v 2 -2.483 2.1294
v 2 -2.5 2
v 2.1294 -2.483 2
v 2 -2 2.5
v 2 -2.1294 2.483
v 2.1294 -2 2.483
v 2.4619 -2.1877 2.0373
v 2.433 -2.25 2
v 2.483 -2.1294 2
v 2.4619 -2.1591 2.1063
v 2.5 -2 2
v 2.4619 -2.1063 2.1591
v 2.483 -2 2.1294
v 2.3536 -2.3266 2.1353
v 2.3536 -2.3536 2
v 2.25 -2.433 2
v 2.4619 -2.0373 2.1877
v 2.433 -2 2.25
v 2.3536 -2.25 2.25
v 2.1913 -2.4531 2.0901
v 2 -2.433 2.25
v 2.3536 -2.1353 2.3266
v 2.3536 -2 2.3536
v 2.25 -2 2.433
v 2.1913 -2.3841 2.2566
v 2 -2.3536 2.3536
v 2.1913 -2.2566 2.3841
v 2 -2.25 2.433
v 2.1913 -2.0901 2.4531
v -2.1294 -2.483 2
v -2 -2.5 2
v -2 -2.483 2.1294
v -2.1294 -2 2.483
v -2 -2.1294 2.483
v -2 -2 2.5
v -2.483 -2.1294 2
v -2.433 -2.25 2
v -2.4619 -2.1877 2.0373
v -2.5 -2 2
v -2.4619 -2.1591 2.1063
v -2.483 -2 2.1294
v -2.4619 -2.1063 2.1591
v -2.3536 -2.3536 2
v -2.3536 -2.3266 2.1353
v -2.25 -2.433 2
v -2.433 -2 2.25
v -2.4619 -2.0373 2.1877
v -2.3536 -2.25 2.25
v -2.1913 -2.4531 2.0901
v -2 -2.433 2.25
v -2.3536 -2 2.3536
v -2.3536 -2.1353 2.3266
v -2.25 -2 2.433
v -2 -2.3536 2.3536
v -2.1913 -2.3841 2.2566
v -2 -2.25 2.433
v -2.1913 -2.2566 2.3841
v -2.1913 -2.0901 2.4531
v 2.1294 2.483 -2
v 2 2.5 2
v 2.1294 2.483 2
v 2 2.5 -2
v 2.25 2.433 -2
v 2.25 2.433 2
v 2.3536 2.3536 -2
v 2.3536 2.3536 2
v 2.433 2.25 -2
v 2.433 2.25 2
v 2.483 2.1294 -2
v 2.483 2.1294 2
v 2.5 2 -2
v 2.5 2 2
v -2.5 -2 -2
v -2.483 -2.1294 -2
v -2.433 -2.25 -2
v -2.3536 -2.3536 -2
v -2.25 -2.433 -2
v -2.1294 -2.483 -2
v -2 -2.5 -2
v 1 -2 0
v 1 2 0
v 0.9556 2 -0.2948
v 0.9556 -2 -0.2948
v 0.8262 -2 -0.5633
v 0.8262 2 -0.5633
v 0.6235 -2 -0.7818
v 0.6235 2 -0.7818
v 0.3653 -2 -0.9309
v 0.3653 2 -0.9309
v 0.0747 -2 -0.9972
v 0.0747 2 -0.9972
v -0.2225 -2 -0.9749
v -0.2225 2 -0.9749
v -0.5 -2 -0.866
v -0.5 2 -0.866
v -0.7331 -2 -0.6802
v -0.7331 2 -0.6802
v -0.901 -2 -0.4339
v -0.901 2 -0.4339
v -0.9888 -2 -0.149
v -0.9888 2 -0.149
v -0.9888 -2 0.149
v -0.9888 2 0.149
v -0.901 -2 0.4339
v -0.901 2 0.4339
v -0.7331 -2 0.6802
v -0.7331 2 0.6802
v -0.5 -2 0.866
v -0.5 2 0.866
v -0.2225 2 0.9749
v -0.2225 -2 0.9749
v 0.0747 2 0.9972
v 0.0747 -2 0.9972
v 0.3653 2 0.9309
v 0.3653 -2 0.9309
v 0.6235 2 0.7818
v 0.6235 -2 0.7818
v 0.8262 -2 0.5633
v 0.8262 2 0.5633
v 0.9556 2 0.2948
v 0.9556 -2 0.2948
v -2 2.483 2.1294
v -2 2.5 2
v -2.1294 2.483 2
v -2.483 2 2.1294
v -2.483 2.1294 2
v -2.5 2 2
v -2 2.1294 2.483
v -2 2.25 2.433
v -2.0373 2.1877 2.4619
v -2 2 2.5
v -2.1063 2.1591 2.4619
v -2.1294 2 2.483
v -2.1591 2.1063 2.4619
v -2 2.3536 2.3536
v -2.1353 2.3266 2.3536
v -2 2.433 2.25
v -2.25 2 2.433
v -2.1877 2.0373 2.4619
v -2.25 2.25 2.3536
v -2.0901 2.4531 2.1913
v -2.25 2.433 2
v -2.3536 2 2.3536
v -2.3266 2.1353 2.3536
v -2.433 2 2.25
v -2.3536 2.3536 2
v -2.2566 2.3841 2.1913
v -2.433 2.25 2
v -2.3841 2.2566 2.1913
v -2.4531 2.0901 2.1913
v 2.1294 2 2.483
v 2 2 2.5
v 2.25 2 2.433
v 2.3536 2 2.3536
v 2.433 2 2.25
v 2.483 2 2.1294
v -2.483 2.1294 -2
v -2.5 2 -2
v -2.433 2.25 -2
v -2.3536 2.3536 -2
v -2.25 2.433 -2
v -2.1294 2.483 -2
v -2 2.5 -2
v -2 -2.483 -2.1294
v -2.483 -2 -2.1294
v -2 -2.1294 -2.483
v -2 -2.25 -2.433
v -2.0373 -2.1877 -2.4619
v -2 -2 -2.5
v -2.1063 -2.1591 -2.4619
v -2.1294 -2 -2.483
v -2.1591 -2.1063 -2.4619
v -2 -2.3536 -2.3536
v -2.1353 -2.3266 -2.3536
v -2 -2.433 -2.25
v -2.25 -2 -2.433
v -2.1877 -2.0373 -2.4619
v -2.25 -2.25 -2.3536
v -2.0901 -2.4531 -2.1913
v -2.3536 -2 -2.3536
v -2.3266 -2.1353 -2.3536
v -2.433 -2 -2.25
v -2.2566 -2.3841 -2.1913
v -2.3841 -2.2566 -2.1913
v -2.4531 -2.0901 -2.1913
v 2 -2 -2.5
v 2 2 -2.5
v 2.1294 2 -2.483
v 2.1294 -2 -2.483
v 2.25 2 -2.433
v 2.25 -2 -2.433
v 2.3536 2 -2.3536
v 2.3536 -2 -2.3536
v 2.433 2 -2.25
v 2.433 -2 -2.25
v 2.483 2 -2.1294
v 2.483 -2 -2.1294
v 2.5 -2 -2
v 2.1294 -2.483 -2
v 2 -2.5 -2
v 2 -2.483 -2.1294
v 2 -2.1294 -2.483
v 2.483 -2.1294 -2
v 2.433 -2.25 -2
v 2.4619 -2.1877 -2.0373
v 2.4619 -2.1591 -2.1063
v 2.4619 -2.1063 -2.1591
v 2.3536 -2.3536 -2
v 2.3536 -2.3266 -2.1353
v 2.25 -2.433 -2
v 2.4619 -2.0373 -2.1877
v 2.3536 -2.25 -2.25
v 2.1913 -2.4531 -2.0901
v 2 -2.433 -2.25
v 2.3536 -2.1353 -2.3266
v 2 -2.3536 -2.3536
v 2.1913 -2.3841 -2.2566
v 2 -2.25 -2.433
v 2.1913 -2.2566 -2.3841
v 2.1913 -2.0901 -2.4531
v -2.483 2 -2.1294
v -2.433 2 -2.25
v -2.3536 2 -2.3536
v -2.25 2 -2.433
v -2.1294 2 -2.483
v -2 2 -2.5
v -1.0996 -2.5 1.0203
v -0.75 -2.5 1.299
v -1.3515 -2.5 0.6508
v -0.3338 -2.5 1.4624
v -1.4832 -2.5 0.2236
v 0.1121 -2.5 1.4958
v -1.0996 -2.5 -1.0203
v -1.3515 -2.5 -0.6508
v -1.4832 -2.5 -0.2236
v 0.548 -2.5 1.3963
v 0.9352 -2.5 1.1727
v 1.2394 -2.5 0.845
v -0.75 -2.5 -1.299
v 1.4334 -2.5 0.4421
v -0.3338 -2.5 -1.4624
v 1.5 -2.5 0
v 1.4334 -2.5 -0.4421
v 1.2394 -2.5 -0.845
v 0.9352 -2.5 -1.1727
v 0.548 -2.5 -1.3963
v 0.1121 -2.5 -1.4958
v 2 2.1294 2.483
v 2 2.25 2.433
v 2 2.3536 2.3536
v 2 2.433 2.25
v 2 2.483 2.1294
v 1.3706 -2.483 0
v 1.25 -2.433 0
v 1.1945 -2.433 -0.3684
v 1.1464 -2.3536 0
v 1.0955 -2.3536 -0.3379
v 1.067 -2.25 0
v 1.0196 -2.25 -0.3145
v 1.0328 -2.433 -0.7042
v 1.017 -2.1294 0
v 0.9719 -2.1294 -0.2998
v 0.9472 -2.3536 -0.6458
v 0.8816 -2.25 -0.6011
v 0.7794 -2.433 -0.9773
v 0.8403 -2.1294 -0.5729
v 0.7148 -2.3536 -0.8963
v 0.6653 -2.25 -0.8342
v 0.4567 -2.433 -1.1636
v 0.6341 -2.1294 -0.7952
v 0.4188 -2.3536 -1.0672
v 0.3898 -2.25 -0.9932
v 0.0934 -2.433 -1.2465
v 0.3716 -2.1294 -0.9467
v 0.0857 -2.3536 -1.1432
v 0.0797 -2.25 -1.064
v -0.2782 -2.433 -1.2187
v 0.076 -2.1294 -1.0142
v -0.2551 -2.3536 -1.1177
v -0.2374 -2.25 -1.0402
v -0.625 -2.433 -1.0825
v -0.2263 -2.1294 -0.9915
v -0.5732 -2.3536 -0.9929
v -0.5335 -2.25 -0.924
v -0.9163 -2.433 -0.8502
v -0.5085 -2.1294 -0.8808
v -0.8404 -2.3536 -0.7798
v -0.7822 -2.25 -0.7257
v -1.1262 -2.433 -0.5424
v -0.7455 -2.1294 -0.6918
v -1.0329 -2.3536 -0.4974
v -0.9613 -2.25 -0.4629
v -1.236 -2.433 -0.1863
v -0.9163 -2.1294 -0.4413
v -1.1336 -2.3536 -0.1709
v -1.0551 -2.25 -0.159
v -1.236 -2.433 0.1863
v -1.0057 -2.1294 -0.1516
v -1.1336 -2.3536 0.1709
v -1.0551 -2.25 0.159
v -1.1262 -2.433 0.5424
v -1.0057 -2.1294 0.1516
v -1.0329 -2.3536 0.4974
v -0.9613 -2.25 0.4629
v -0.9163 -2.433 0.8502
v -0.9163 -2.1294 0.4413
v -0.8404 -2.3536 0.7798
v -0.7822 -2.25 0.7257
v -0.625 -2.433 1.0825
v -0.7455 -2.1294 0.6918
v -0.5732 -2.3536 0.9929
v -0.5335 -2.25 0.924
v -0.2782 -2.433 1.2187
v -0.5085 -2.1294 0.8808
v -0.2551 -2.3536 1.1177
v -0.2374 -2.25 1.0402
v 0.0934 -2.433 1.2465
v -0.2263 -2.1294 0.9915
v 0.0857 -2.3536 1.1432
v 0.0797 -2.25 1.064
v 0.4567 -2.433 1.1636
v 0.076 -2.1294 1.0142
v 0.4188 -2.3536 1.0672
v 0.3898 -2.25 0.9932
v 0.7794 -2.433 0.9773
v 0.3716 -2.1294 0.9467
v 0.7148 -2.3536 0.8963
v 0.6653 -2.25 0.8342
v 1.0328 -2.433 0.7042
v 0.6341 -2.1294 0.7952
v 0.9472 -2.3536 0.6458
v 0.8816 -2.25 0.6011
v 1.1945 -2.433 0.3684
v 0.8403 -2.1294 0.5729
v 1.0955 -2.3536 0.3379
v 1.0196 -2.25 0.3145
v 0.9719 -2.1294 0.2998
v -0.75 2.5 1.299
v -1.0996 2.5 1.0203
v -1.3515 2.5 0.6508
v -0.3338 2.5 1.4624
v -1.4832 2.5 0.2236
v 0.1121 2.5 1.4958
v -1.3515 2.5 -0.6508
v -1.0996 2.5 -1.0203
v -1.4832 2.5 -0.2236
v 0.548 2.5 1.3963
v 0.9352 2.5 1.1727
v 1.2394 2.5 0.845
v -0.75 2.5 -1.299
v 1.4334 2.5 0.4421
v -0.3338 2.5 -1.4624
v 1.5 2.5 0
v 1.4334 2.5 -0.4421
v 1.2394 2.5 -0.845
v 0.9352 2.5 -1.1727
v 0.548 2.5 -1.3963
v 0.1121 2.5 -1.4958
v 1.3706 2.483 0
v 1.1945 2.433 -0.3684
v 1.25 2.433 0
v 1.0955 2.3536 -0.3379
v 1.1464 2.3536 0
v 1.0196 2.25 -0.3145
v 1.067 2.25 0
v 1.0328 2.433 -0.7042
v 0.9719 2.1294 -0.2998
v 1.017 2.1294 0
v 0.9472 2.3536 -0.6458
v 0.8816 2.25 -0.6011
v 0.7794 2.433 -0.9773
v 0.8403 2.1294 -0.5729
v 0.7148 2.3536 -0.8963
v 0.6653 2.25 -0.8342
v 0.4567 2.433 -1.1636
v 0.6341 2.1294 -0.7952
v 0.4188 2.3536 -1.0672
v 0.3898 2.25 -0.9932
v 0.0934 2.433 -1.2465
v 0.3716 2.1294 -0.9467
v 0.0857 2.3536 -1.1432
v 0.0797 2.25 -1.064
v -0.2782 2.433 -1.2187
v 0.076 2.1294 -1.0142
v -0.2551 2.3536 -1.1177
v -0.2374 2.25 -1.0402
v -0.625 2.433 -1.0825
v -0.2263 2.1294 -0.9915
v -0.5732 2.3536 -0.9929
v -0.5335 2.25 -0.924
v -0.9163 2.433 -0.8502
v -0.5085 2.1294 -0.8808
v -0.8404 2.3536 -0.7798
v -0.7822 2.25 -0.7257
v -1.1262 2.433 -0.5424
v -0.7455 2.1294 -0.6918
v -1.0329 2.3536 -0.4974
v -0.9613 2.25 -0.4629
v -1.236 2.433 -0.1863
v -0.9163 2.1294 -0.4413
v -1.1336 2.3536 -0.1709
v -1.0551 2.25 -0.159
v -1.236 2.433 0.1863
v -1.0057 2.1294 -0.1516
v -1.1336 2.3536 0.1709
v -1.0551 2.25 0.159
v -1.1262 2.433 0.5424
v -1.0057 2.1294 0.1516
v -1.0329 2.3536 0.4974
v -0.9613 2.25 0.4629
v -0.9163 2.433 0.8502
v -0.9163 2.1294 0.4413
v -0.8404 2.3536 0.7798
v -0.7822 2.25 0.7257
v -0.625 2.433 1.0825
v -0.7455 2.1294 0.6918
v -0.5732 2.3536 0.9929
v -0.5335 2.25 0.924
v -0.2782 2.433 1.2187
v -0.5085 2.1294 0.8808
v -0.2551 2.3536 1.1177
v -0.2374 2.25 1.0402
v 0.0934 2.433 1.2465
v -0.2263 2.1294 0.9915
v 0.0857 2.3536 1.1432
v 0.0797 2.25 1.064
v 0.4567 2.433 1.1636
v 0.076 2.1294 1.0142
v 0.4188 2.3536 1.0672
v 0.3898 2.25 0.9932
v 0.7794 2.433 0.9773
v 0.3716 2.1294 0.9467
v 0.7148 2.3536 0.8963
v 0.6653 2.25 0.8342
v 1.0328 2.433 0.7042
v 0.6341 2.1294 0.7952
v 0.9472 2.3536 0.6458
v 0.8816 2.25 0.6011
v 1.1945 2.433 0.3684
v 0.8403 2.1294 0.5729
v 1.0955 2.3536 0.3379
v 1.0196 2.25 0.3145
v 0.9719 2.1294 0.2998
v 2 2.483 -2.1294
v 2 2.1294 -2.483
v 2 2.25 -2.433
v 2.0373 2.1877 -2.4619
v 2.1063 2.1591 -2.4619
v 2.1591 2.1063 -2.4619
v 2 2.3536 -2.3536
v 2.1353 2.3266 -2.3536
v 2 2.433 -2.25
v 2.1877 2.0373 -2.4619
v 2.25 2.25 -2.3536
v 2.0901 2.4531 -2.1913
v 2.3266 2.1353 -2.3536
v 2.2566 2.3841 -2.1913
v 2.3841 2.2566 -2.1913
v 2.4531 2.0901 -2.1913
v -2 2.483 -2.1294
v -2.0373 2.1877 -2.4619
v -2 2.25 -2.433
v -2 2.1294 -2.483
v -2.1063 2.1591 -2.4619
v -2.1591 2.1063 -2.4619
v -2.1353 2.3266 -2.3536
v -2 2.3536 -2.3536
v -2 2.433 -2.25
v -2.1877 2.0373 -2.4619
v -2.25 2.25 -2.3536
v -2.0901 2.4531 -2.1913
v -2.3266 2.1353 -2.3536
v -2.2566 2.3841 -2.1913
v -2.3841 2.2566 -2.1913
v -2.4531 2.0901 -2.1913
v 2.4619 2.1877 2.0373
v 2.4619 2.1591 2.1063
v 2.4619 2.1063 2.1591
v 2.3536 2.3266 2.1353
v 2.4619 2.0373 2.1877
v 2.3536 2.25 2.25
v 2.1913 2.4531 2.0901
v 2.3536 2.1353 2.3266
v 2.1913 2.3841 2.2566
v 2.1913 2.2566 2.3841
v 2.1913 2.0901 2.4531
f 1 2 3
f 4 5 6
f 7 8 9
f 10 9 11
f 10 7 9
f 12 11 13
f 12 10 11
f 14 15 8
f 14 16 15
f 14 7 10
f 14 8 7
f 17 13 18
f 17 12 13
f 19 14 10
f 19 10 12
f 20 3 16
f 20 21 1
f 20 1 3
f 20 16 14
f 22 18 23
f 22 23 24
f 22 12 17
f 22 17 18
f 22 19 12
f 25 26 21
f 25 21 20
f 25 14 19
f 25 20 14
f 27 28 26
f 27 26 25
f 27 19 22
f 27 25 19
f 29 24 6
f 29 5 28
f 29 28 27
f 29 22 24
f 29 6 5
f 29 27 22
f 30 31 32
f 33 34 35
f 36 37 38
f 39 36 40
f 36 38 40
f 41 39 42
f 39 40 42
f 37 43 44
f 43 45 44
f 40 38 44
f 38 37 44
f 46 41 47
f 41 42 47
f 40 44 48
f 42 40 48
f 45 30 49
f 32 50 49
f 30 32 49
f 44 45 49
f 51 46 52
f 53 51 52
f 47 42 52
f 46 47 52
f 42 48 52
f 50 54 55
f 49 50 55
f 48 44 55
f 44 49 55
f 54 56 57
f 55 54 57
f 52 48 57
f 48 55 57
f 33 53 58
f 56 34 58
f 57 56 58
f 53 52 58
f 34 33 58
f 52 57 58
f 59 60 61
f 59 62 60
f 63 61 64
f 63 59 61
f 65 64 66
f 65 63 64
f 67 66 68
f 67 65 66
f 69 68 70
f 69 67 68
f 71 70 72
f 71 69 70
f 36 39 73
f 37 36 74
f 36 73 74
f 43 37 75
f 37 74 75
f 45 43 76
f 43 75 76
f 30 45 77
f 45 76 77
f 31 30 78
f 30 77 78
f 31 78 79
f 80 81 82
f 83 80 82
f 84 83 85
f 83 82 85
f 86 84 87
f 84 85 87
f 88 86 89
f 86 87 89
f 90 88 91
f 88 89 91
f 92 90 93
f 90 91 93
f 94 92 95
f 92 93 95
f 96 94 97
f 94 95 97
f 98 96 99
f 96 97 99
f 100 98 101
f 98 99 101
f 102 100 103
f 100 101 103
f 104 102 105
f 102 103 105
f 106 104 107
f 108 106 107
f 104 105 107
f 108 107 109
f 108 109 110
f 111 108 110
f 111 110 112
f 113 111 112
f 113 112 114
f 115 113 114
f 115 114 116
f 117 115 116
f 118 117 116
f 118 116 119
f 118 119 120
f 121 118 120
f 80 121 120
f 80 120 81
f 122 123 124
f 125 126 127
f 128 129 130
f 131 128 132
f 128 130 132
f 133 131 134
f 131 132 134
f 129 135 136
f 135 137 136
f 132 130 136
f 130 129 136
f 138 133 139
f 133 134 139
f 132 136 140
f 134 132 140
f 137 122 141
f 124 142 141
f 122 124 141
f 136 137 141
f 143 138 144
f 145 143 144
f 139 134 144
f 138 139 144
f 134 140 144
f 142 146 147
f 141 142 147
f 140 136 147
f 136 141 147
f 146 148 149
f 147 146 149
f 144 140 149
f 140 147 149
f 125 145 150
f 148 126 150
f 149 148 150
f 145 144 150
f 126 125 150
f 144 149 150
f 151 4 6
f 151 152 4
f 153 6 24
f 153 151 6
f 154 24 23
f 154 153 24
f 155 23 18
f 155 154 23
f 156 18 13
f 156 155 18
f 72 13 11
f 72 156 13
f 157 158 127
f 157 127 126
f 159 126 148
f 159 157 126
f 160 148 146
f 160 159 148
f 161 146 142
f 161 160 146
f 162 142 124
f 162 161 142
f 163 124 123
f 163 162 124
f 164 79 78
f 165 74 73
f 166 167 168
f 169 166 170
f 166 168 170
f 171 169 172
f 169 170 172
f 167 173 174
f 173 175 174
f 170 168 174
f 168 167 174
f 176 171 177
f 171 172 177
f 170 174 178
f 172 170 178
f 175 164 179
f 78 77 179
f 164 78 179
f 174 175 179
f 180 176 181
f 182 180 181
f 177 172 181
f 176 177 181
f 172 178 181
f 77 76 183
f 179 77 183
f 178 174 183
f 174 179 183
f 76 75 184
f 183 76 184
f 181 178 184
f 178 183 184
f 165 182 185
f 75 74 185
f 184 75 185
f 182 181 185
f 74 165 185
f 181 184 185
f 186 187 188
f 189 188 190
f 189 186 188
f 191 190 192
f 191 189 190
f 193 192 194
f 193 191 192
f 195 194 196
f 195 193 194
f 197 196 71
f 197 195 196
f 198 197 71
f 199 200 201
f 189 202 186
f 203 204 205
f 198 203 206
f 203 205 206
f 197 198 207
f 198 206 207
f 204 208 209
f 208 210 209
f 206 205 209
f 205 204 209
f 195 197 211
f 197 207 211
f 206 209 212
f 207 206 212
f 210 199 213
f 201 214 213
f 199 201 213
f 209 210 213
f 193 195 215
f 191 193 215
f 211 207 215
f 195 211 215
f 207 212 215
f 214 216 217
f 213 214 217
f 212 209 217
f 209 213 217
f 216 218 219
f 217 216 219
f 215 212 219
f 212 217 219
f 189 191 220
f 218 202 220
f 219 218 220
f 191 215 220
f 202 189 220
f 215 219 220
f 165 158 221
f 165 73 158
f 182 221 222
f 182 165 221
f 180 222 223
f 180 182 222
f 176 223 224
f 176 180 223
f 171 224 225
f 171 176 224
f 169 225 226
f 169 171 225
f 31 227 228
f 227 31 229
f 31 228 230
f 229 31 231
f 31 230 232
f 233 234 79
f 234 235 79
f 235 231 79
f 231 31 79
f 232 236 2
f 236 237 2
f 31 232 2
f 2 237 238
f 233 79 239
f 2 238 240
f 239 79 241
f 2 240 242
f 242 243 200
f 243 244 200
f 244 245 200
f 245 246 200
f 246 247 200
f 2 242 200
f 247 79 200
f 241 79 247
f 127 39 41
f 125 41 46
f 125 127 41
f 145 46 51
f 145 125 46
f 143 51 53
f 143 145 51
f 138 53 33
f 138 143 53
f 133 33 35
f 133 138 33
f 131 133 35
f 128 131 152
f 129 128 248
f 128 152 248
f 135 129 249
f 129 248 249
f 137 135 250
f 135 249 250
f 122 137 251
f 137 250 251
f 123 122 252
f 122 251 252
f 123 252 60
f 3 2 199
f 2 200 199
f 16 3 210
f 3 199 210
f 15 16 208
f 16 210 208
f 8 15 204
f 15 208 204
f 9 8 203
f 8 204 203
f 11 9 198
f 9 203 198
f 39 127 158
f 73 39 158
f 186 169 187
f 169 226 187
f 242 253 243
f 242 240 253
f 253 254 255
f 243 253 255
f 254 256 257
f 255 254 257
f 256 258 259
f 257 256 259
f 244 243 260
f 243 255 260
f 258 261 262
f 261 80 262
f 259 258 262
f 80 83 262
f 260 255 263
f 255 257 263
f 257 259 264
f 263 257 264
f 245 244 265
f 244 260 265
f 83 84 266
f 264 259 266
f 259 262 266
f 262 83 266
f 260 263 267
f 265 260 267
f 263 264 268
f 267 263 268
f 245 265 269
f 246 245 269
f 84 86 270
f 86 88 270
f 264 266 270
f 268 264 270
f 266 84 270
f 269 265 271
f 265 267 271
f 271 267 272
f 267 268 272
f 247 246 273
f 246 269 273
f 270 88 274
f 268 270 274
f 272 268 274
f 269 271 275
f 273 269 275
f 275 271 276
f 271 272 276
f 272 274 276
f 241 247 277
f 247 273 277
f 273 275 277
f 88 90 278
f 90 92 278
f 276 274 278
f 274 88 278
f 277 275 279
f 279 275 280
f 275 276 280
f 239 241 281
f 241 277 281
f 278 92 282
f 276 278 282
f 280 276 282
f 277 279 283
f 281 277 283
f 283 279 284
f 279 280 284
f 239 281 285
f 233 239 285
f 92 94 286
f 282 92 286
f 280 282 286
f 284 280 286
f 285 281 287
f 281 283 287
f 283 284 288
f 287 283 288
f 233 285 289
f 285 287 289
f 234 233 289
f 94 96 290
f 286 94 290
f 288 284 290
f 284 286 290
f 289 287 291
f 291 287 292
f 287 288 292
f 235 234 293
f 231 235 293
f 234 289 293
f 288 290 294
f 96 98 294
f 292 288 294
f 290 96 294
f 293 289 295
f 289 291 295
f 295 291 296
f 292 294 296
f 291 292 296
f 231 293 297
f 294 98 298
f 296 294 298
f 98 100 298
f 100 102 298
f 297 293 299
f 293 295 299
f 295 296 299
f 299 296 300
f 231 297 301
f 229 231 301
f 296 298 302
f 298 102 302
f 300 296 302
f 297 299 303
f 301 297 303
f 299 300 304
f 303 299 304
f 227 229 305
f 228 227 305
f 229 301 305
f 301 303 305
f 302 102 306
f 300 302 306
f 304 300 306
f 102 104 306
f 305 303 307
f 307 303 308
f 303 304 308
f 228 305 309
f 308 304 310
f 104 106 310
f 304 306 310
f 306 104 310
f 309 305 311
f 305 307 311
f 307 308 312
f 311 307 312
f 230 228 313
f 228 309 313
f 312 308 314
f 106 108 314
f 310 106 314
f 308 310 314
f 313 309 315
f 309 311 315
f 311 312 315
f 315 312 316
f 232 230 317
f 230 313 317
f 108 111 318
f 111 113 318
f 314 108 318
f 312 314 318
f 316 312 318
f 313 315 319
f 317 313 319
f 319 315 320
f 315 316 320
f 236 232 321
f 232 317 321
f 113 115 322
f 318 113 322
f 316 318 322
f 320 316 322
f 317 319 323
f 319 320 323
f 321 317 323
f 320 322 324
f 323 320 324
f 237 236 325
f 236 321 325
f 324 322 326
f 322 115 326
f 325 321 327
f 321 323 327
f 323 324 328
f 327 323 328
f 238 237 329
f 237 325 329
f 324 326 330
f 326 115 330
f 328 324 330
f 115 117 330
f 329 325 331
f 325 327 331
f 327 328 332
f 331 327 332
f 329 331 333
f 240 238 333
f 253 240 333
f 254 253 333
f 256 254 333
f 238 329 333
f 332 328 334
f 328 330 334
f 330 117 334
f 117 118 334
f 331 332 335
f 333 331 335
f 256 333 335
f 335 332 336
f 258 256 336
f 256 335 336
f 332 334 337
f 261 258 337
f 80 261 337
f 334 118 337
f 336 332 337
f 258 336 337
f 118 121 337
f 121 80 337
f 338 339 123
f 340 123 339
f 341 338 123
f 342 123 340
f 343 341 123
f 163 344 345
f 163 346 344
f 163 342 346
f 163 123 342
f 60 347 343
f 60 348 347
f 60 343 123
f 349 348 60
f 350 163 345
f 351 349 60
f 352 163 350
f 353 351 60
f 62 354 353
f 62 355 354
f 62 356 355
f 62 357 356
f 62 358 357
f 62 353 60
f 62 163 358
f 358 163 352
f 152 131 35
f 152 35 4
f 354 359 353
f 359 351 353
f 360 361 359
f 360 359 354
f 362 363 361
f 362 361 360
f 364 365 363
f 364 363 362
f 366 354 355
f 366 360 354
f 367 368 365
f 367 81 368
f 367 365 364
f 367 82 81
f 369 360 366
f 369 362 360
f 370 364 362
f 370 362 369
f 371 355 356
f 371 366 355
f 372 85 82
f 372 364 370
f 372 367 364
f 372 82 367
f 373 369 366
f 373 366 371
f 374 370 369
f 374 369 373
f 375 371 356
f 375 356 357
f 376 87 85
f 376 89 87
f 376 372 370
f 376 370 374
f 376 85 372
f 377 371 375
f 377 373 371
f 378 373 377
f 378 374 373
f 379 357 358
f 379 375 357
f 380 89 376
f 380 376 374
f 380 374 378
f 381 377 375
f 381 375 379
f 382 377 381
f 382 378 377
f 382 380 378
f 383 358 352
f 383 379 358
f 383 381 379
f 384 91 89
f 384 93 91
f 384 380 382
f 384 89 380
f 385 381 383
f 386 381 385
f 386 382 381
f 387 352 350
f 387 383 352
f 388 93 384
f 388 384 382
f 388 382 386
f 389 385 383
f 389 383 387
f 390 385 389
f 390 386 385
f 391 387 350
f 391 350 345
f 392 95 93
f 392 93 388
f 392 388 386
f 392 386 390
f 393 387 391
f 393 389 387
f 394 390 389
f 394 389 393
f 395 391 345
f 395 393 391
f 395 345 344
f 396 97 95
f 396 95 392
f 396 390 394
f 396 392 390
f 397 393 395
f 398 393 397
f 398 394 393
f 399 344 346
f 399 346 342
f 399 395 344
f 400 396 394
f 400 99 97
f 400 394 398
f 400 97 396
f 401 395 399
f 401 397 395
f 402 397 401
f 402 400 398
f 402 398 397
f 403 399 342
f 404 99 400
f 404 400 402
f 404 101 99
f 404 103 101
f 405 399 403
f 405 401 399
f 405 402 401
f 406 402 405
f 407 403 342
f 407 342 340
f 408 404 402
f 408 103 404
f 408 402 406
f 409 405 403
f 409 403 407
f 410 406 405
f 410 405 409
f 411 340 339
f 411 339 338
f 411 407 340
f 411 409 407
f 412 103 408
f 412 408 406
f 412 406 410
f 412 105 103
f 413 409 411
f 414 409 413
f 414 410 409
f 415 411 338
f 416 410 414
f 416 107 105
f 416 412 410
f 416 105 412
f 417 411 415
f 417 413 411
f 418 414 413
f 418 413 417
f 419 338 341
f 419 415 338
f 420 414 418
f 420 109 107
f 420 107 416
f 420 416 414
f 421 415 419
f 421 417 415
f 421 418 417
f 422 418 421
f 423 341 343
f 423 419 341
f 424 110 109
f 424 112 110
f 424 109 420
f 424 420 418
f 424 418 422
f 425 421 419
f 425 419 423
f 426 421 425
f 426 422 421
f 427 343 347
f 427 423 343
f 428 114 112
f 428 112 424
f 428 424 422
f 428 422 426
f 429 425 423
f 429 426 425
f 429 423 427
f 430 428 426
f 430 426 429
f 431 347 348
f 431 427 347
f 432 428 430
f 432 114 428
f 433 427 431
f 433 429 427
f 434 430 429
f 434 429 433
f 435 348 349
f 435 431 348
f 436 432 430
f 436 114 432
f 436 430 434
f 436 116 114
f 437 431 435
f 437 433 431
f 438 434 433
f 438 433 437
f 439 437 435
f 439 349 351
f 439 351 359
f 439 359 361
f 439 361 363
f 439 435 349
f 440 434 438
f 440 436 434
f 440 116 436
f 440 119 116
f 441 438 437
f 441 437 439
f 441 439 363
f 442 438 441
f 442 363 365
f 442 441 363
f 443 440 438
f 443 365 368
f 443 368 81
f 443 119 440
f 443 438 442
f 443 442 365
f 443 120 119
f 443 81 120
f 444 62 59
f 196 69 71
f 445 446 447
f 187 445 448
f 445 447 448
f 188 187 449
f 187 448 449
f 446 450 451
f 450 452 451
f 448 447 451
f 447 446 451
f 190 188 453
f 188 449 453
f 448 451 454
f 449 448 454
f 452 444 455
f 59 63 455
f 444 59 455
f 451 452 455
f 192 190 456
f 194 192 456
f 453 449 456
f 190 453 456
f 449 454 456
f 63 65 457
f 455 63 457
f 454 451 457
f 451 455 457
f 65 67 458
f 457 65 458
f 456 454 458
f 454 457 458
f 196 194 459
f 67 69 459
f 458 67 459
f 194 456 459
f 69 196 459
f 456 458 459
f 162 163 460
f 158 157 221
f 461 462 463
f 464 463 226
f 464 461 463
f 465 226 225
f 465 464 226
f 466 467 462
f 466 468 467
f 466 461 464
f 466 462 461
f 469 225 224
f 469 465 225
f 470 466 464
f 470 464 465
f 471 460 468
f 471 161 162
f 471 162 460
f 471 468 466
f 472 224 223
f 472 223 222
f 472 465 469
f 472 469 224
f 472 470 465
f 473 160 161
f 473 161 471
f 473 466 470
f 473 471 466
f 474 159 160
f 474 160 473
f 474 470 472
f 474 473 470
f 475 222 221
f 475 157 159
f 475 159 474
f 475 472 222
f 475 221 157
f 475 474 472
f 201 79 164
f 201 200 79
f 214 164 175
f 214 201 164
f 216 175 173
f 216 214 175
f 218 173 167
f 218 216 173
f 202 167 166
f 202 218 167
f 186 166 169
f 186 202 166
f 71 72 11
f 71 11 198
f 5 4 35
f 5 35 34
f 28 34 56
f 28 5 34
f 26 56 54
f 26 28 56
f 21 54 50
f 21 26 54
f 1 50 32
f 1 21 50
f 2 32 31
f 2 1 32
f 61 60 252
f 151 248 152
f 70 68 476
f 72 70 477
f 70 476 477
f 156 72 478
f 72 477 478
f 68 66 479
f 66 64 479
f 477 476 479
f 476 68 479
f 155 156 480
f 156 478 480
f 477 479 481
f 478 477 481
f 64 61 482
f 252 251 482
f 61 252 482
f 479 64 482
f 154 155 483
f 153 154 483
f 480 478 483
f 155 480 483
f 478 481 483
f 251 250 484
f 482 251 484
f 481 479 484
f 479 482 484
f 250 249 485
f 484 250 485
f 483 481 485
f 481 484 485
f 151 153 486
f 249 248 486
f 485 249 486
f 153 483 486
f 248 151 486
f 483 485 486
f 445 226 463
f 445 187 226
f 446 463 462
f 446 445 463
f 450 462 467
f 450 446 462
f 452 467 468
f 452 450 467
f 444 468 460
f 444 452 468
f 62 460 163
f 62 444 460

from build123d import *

# Parameters (mm, degrees)
CROQUIS1_W              = 5
CROQUIS1_H              = 5
SALIENTE_EXTRUIR1_DEPTH = 2.5
CROQUIS2_R              = 1
CORTAR_EXTRUIR1_DEPTH   = 6
REDONDEO1_R             = 0.5


with BuildPart() as part:
    # Croquis1 → Saliente-Extruir1 (new body, symmetric)
    with BuildSketch(Plane(origin=(0, 0, 0), x_dir=(1, 0, 0), z_dir=(0, 1, 0))):
        Rectangle(CROQUIS1_W, CROQUIS1_H)
    extrude(amount=SALIENTE_EXTRUIR1_DEPTH, both=True)

    # Croquis2 → Cortar-Extruir1 (cut, through all)
    with BuildSketch(Plane(origin=(0, 2.5, 0), x_dir=(1, 0, 0), z_dir=(0, 1, 0))):
        Circle(CROQUIS2_R)
    extrude(amount=-CORTAR_EXTRUIR1_DEPTH, mode=Mode.SUBTRACT)

    # Redondeo1
    redondeo1_edges = [part.edges().sort_by_distance(p)[0] for p in [
        (-2.5, 2.5, 0),
        (0, 2.5, 2.5),
        (-1, -2.5, 0),
        (-1, 2.5, 0),
        (2.5, 2.5, 0),
        (0, -2.5, 2.5),
        (-2.5, -2.5, 0),
        (0, -2.5, -2.5),
        (2.5, -2.5, 0),
        (0, 2.5, -2.5),
        (2.5, 0, 2.5),
        (-2.5, 0, 2.5),
        (-2.5, 0, -2.5),
        (2.5, 0, -2.5),
    ]]
    fillet(redondeo1_edges, radius=REDONDEO1_R)


solid = part.part
